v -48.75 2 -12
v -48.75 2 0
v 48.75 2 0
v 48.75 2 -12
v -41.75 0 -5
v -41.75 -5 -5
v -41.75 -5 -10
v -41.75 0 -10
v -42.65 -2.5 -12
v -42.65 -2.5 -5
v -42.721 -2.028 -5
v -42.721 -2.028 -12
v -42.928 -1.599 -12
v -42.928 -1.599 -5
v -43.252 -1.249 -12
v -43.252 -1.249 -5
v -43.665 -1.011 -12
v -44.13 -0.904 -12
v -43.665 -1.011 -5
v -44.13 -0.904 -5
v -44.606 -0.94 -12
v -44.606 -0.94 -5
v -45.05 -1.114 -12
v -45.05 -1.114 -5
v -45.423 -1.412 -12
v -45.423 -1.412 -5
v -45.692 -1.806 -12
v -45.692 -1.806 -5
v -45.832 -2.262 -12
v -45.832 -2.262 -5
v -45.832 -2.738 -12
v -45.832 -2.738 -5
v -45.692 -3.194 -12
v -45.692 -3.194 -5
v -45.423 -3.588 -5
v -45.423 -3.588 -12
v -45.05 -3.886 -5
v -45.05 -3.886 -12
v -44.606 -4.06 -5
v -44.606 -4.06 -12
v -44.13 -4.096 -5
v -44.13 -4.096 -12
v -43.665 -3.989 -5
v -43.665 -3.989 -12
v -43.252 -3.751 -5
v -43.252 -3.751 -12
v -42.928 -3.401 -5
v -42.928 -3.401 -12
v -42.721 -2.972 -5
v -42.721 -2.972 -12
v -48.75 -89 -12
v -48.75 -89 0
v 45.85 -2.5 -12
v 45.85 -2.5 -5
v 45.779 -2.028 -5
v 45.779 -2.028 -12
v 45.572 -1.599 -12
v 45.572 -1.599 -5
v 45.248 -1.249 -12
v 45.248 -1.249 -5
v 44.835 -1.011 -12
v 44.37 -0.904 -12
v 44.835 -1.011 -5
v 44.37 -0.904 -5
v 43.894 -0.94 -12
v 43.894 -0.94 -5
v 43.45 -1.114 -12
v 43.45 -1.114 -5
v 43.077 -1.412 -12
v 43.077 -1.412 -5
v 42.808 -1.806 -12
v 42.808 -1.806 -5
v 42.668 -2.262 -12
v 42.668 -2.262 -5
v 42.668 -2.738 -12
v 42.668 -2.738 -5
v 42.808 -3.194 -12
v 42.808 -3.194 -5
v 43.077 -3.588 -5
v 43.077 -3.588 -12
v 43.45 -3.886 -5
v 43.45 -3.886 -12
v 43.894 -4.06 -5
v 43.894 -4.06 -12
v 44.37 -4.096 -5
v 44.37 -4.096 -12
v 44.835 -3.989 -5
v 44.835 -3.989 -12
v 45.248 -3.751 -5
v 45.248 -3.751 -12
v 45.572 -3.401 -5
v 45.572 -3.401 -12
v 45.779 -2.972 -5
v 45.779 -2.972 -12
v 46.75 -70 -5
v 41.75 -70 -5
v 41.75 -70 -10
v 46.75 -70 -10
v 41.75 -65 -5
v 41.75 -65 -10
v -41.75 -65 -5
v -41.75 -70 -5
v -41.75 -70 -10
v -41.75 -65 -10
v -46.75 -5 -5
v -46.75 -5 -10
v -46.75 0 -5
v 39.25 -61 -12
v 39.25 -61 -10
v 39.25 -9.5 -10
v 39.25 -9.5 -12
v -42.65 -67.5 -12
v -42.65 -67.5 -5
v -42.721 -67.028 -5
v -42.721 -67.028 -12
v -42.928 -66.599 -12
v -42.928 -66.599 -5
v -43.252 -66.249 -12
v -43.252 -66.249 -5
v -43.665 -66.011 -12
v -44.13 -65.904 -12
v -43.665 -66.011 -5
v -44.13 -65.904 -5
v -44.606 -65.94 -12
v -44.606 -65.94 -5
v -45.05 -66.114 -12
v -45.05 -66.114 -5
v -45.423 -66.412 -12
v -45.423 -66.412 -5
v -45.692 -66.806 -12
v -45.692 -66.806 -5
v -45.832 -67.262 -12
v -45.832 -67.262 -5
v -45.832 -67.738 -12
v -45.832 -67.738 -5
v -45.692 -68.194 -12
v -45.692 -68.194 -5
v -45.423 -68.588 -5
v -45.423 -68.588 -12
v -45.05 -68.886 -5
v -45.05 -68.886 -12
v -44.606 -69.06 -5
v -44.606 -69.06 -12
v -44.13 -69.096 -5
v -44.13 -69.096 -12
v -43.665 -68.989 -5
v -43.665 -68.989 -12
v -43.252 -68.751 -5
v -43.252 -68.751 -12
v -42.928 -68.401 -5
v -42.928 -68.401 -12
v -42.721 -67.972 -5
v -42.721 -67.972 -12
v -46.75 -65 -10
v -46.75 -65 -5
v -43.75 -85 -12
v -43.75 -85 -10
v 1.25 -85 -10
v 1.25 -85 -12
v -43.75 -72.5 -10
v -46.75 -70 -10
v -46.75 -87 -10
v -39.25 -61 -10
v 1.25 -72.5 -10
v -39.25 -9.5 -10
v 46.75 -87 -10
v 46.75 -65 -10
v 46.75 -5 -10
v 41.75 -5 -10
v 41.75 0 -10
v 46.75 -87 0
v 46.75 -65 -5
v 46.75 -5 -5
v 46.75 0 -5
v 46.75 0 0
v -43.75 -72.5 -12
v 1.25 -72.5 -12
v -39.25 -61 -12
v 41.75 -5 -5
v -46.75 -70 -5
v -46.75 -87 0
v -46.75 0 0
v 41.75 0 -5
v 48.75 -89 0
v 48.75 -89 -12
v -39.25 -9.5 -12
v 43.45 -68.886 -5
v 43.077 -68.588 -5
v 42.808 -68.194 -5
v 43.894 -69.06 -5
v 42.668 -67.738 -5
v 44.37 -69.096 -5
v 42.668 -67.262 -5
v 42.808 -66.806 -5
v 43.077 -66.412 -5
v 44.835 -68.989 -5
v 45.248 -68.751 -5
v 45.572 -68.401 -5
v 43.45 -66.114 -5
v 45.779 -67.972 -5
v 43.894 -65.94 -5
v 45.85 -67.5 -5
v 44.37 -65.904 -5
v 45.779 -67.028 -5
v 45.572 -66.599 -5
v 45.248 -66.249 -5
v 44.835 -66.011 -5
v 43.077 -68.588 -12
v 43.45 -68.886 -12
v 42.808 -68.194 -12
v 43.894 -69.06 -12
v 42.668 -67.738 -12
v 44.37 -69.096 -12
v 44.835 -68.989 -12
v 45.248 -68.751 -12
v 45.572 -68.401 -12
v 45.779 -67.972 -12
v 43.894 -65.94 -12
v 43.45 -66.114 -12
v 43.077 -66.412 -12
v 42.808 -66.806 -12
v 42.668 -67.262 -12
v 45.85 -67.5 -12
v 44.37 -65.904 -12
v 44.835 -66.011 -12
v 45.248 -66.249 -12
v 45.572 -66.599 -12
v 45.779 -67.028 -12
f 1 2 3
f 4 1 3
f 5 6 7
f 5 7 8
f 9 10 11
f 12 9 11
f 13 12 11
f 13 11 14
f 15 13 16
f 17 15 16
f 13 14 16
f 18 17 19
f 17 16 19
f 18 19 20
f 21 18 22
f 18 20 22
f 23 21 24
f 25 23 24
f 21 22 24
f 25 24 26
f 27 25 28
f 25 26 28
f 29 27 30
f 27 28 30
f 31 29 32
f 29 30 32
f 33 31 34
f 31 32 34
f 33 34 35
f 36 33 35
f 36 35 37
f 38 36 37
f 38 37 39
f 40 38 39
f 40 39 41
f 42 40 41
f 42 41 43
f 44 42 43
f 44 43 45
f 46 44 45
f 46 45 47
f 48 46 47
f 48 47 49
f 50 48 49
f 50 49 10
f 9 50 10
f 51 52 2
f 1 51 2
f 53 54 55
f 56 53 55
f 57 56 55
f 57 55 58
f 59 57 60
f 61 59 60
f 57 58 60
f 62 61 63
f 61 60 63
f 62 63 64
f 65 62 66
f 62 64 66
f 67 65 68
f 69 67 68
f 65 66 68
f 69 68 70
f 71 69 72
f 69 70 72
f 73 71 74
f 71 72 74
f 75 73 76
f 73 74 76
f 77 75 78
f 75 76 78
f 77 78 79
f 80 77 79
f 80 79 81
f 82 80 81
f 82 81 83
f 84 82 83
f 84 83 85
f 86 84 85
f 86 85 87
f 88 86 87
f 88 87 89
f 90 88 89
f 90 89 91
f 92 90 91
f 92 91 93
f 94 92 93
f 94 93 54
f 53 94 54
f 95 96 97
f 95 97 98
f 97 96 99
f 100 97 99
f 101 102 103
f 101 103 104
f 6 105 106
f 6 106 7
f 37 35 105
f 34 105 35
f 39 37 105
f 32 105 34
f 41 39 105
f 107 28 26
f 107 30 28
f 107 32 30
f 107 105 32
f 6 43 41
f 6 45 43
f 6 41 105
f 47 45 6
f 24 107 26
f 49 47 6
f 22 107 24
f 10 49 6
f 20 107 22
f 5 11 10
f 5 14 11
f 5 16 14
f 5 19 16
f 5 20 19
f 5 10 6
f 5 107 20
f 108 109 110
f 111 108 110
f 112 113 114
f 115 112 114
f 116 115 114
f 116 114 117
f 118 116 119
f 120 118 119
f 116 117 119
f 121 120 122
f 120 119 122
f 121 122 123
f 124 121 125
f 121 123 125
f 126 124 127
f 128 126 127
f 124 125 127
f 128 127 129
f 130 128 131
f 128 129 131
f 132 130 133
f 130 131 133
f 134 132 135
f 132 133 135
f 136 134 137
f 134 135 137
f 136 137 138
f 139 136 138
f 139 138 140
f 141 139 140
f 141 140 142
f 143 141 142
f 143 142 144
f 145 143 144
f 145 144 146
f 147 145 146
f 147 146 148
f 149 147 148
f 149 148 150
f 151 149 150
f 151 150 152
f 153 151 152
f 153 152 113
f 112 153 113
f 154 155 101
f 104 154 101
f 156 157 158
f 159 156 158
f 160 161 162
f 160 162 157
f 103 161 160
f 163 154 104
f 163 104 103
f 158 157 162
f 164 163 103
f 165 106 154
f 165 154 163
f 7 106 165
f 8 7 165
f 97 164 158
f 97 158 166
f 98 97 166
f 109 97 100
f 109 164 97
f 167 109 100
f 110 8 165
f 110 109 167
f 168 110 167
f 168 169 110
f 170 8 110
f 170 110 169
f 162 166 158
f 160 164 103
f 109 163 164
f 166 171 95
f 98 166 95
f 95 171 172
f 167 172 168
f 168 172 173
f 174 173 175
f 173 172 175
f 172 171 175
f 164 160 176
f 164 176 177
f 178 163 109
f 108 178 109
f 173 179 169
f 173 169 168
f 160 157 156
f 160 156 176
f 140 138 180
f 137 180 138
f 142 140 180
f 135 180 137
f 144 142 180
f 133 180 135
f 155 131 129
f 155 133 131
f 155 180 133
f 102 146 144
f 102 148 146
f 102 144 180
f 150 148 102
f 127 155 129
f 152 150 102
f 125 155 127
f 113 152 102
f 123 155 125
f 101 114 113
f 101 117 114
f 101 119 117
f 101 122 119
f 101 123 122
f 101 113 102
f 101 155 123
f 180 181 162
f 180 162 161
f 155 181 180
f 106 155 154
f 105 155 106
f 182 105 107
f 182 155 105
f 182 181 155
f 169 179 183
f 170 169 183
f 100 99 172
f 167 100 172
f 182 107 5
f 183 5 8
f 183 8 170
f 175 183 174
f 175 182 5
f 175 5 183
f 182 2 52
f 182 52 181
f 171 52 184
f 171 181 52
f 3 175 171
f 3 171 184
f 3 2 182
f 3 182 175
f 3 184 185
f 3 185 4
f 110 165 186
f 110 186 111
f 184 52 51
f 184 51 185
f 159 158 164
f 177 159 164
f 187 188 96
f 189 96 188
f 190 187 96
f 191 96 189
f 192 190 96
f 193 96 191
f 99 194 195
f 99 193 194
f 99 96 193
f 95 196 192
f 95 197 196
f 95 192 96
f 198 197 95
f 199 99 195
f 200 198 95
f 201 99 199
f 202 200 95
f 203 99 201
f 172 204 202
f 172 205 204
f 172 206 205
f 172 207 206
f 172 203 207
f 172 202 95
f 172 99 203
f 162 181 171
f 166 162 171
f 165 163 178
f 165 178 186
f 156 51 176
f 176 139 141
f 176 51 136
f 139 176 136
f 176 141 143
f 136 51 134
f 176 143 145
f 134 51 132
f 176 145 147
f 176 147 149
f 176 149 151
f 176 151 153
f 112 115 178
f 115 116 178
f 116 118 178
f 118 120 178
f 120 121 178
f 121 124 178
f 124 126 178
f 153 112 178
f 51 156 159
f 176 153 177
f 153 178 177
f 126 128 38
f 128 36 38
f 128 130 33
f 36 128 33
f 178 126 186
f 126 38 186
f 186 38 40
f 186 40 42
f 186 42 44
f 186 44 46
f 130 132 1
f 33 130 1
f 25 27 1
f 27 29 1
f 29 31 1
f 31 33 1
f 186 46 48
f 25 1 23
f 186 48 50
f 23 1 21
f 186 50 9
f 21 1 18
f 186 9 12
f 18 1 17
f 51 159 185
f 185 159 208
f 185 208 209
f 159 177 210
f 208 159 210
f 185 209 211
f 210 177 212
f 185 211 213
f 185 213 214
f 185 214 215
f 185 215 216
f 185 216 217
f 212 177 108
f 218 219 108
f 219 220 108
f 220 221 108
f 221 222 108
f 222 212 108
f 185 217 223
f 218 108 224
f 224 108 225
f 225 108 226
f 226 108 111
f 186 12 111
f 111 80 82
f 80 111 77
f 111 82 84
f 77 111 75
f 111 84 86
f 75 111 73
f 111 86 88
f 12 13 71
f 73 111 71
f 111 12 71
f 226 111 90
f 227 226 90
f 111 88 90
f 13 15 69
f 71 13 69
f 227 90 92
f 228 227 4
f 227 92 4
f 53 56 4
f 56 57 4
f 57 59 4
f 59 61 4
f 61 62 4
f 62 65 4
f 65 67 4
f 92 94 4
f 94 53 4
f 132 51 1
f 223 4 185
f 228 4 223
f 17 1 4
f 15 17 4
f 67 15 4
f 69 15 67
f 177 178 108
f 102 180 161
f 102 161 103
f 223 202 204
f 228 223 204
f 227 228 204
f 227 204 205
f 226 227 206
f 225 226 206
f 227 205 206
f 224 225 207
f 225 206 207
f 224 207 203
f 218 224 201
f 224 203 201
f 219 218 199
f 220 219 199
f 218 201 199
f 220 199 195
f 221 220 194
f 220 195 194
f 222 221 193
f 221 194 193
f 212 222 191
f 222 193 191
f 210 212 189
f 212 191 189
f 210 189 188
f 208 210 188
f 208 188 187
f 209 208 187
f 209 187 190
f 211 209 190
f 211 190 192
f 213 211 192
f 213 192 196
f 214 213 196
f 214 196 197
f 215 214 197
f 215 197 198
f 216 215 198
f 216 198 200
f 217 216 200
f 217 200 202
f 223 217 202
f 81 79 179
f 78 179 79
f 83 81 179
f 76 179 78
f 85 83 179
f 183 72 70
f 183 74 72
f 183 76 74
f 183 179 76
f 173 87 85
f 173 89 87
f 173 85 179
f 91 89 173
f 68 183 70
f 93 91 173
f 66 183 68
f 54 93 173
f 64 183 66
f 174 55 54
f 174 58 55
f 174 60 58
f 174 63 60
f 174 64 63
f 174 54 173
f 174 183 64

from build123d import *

# Parameters (mm, degrees)
SKETCH001_W     = 97.5
SKETCH001_H     = 91
PAD_DEPTH       = 12
SKETCH_W        = 93.5
SKETCH_H        = 87
POCKET_DEPTH    = 10
SKETCH002_W     = 5
SKETCH002_H     = 5
SKETCH002_R     = 1.6
PAD001_DEPTH    = 10
POCKET001_DEPTH = 5
SKETCH003_W     = 78.5
SKETCH003_H     = 51.5
POCKET002_DEPTH = 12.001
SKETCH004_W     = 45
SKETCH004_H     = 12.5
POCKET003_DEPTH = 12.001
SKETCH005_R     = 1.6
POCKET004_DEPTH = 12.001


with BuildPart() as part:
    # Sketch001 → Pad (new body)
    with BuildSketch(Plane.XY):
        with Locations((0, -43.5)):
            Rectangle(SKETCH001_W, SKETCH001_H)
    extrude(amount=-PAD_DEPTH)

    # Sketch → Pocket (cut)
    with BuildSketch(Plane.XY):
        with Locations((0, -43.5)):
            Rectangle(SKETCH_W, SKETCH_H)
    extrude(amount=-POCKET_DEPTH, mode=Mode.SUBTRACT)

    # Sketch002 → Pad001 (join)
    with BuildSketch(Plane.XY):
        with Locations((-44.25, -2.5)):
            Rectangle(SKETCH002_W, SKETCH002_H)
        with Locations((-44.25, -2.5)):
            Circle(SKETCH002_R, mode=Mode.SUBTRACT)
        with Locations((-44.25, -67.5)):
            Rectangle(SKETCH002_W, SKETCH002_H)
        with Locations((-44.25, -67.5)):
            Circle(SKETCH002_R, mode=Mode.SUBTRACT)
        with Locations((44.25, -67.5)):
            Rectangle(SKETCH002_W, SKETCH002_H)
        with Locations((44.25, -67.5)):
            Circle(SKETCH002_R, mode=Mode.SUBTRACT)
        with Locations((44.25, -2.5)):
            Rectangle(SKETCH002_W, SKETCH002_H)
        with Locations((44.25, -2.5)):
            Circle(SKETCH002_R, mode=Mode.SUBTRACT)
    extrude(amount=-PAD001_DEPTH)

    # Sketch → Pocket001 (cut)
    with BuildSketch(Plane.XY):
        with Locations((0, -43.5)):
            Rectangle(SKETCH_W, SKETCH_H)
    extrude(amount=-POCKET001_DEPTH, mode=Mode.SUBTRACT)

    # Sketch003 → Pocket002 (cut, through all)
    with BuildSketch(Plane.XY):
        with Locations((0, -35.25)):
            Rectangle(SKETCH003_W, SKETCH003_H)
    extrude(amount=-POCKET002_DEPTH, mode=Mode.SUBTRACT)

    # Sketch004 → Pocket003 (cut, through all)
    with BuildSketch(Plane.XY):
        with Locations((-21.25, -78.75)):
            Rectangle(SKETCH004_W, SKETCH004_H)
    extrude(amount=-POCKET003_DEPTH, mode=Mode.SUBTRACT)

    # Sketch005 → Pocket004 (cut, through all)
    with BuildSketch(Plane.XY):
        with Locations((-44.25, -2.5)):
            Circle(SKETCH005_R)
        with Locations((44.25, -2.5)):
            Circle(SKETCH005_R)
        with Locations((44.25, -67.5)):
            Circle(SKETCH005_R)
        with Locations((-44.25, -67.5)):
            Circle(SKETCH005_R)
    extrude(amount=-POCKET004_DEPTH, mode=Mode.SUBTRACT)


solid = part.part
